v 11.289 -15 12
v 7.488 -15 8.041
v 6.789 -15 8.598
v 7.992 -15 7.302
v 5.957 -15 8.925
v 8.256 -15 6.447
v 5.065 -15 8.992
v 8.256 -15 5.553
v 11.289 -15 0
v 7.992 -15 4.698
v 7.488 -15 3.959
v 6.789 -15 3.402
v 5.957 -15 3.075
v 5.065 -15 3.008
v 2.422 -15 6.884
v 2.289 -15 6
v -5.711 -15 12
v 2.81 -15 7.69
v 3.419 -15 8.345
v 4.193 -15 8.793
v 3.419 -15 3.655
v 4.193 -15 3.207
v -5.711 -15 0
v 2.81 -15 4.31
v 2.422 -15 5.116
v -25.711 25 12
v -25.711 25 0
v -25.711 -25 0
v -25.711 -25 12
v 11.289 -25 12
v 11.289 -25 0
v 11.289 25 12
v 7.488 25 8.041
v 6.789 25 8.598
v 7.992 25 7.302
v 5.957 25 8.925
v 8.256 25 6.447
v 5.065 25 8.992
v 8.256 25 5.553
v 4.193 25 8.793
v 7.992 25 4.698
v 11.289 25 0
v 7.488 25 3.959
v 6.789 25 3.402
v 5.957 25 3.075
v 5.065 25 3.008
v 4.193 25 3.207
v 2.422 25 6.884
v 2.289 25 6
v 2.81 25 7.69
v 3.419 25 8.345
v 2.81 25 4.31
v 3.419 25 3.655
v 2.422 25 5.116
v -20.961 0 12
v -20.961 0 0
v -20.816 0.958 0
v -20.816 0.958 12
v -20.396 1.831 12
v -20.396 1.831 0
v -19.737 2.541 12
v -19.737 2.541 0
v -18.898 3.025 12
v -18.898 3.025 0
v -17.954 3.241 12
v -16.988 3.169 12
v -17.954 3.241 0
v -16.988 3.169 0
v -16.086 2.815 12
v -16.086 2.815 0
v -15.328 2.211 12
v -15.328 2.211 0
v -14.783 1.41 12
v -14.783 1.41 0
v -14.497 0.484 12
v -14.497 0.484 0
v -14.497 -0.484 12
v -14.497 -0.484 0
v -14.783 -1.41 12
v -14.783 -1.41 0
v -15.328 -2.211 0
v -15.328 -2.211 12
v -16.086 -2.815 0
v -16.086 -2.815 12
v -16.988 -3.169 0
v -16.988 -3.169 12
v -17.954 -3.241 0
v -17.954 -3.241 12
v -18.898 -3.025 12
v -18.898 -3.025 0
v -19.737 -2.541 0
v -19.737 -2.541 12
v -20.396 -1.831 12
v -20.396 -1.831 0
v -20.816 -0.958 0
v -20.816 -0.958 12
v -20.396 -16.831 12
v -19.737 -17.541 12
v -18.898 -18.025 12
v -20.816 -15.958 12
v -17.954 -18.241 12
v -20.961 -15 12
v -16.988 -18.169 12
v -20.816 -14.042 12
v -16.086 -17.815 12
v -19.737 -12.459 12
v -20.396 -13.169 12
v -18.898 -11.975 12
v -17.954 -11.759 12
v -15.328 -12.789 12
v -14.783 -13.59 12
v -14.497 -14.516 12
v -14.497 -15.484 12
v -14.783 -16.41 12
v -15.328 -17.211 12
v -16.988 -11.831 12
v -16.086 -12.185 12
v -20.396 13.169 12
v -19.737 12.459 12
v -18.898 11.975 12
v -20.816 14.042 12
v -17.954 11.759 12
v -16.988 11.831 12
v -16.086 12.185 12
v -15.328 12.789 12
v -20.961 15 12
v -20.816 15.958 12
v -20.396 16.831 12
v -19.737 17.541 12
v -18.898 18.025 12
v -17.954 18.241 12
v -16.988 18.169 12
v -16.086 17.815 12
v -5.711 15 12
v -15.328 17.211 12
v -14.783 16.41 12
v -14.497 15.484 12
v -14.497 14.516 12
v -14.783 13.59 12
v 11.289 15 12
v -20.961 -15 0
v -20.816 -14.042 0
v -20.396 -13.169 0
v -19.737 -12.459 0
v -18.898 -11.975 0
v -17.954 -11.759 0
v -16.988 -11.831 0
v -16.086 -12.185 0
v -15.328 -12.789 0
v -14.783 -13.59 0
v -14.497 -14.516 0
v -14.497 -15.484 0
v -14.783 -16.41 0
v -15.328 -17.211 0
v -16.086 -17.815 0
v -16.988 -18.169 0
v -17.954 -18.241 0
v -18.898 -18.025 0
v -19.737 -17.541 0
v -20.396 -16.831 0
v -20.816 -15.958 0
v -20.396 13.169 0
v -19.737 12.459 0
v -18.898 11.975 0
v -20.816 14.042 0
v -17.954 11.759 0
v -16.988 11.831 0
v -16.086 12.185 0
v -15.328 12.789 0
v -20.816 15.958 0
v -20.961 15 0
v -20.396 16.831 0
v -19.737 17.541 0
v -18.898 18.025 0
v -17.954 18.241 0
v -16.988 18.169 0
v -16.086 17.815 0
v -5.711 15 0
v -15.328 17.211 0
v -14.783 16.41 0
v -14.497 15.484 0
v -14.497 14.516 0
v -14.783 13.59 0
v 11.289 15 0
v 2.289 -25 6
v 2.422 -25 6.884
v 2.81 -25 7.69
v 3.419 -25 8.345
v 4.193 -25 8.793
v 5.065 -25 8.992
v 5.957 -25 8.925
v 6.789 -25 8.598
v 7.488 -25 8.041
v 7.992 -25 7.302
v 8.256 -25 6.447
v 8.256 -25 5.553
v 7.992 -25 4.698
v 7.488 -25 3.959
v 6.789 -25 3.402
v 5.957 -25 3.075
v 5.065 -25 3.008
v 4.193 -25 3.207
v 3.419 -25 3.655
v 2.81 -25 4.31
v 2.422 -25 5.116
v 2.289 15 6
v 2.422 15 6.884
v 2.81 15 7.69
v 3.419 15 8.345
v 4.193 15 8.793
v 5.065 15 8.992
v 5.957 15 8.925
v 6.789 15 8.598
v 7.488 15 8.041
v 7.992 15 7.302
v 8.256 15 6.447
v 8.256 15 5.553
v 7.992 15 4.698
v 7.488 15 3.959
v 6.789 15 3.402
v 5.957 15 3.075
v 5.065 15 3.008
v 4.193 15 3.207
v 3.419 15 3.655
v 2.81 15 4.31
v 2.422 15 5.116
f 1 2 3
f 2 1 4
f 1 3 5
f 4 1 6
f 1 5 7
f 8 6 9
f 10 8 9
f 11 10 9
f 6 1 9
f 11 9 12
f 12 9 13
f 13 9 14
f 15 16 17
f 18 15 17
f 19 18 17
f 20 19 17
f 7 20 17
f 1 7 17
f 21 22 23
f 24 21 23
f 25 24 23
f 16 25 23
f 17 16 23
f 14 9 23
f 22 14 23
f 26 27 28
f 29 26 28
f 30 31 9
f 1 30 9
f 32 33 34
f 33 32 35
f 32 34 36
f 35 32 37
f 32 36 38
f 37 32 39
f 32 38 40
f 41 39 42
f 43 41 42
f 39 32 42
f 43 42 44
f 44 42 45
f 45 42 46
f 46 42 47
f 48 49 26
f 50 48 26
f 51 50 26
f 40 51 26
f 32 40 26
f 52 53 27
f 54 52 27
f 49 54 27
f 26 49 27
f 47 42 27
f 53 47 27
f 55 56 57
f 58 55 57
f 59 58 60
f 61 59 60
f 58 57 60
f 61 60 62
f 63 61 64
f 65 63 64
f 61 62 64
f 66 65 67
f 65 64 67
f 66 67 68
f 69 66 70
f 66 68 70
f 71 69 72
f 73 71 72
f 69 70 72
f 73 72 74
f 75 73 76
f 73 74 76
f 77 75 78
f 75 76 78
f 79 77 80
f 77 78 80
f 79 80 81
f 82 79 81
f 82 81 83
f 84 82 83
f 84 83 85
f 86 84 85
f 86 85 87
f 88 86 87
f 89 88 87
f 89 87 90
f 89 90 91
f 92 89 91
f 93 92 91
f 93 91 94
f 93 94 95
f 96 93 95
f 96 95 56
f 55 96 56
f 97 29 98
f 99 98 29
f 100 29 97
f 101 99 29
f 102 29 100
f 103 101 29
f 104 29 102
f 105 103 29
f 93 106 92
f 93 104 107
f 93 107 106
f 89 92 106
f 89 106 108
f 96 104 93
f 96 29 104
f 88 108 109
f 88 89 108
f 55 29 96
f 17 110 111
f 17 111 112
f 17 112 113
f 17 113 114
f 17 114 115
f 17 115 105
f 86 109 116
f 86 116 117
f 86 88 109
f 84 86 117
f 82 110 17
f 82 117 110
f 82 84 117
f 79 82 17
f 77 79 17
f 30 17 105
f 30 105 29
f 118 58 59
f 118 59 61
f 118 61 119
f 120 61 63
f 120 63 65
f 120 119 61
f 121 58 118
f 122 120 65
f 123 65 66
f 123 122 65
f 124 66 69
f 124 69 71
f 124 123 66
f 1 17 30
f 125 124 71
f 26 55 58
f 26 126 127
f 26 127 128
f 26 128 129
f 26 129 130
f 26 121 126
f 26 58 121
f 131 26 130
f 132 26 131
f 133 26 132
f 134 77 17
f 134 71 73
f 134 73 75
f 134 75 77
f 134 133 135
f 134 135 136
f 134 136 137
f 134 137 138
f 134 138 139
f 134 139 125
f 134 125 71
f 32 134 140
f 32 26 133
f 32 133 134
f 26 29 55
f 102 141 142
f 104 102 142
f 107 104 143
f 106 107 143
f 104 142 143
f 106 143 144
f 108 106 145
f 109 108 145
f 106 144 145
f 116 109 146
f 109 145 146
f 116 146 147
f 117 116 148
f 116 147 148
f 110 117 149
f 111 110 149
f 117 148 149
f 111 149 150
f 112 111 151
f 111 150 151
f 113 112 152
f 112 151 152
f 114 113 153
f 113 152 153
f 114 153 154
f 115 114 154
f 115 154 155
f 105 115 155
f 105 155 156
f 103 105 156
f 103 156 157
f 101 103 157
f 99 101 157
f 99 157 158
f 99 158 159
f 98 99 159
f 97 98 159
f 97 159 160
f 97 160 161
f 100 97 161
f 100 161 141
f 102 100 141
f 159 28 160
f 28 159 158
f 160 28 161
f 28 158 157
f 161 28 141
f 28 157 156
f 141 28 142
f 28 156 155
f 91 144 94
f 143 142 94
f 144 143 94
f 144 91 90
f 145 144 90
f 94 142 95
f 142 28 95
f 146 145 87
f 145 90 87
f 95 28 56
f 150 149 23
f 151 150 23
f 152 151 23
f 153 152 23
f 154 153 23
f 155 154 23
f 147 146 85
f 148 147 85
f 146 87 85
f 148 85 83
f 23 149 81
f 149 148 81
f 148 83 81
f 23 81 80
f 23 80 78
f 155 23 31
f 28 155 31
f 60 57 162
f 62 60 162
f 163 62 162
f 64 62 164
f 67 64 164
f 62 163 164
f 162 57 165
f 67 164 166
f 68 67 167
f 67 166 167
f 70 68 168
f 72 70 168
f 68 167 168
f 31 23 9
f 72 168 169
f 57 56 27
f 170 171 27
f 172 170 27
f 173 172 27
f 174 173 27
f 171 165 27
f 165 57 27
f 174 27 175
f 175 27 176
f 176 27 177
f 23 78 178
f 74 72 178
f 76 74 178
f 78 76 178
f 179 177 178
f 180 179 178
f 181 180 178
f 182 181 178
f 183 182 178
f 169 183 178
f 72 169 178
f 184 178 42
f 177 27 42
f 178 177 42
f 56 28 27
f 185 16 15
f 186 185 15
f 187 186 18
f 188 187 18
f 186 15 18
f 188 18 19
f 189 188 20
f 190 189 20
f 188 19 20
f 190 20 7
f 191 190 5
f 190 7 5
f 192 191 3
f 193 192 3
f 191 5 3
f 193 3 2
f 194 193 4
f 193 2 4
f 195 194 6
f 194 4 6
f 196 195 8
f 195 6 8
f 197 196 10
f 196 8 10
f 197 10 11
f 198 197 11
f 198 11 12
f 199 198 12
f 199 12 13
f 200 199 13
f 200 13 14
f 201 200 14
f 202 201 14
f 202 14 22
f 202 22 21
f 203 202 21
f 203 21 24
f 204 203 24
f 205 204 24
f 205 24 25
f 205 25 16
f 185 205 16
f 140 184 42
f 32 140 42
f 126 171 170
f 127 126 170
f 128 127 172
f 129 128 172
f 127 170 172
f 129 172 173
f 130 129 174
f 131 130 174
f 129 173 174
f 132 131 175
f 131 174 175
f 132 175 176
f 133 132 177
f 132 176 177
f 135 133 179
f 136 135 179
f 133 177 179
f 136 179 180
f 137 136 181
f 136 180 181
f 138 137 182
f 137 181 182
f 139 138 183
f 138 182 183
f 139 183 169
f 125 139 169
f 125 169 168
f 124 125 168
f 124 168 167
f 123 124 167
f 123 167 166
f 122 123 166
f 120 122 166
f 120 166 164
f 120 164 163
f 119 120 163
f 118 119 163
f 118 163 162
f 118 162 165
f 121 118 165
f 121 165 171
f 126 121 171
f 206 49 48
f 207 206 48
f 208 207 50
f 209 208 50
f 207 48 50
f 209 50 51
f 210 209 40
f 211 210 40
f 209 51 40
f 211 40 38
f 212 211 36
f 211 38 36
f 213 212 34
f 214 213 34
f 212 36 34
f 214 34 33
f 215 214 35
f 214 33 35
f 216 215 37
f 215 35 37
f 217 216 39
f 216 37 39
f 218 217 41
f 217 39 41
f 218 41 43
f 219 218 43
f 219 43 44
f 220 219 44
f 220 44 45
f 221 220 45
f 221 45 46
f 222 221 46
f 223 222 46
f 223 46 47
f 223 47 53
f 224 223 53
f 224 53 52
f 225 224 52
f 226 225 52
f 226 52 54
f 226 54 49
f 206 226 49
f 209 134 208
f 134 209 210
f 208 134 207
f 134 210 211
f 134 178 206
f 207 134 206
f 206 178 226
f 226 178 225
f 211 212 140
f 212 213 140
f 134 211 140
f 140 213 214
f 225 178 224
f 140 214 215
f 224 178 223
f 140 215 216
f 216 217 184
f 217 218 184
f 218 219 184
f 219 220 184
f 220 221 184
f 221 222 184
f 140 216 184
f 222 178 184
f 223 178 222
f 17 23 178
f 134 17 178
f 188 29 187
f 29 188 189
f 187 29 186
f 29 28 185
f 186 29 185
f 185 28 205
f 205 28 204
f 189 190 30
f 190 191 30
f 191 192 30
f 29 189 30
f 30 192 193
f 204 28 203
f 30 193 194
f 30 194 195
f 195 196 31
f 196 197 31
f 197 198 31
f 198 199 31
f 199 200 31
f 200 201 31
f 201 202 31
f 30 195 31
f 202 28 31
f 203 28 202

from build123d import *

# Parameters (mm, degrees)
F1_DEPTH = 12
F3_D     = 6.5
F5_D     = 6


with BuildPart() as f1:
    # F0 (on Top) → F1 (new body)
    with BuildSketch(Plane.XY):
        Polygon((-25.710834, 25), (-25.710834, 0), (-25.710834, -25), (11.289166, -25), (11.289166, -15), (-5.710834, -15), (-5.710834, 0), (-5.710834, 15), (11.289166, 15), (11.289166, 25), align=None)
    extrude(amount=F1_DEPTH)

    # F3 (through all)
    with Locations(Plane.XY.offset(12)):
        with Locations((-17.710834, -15), (-17.710834, 0), (-17.710834, 15)):
            Hole(F3_D / 2)

    # F5 (through all)
    with Locations(Plane.XZ.offset(25)):
        with Locations((5.289166, 6)):
            Hole(F5_D / 2)


solid = f1.part
